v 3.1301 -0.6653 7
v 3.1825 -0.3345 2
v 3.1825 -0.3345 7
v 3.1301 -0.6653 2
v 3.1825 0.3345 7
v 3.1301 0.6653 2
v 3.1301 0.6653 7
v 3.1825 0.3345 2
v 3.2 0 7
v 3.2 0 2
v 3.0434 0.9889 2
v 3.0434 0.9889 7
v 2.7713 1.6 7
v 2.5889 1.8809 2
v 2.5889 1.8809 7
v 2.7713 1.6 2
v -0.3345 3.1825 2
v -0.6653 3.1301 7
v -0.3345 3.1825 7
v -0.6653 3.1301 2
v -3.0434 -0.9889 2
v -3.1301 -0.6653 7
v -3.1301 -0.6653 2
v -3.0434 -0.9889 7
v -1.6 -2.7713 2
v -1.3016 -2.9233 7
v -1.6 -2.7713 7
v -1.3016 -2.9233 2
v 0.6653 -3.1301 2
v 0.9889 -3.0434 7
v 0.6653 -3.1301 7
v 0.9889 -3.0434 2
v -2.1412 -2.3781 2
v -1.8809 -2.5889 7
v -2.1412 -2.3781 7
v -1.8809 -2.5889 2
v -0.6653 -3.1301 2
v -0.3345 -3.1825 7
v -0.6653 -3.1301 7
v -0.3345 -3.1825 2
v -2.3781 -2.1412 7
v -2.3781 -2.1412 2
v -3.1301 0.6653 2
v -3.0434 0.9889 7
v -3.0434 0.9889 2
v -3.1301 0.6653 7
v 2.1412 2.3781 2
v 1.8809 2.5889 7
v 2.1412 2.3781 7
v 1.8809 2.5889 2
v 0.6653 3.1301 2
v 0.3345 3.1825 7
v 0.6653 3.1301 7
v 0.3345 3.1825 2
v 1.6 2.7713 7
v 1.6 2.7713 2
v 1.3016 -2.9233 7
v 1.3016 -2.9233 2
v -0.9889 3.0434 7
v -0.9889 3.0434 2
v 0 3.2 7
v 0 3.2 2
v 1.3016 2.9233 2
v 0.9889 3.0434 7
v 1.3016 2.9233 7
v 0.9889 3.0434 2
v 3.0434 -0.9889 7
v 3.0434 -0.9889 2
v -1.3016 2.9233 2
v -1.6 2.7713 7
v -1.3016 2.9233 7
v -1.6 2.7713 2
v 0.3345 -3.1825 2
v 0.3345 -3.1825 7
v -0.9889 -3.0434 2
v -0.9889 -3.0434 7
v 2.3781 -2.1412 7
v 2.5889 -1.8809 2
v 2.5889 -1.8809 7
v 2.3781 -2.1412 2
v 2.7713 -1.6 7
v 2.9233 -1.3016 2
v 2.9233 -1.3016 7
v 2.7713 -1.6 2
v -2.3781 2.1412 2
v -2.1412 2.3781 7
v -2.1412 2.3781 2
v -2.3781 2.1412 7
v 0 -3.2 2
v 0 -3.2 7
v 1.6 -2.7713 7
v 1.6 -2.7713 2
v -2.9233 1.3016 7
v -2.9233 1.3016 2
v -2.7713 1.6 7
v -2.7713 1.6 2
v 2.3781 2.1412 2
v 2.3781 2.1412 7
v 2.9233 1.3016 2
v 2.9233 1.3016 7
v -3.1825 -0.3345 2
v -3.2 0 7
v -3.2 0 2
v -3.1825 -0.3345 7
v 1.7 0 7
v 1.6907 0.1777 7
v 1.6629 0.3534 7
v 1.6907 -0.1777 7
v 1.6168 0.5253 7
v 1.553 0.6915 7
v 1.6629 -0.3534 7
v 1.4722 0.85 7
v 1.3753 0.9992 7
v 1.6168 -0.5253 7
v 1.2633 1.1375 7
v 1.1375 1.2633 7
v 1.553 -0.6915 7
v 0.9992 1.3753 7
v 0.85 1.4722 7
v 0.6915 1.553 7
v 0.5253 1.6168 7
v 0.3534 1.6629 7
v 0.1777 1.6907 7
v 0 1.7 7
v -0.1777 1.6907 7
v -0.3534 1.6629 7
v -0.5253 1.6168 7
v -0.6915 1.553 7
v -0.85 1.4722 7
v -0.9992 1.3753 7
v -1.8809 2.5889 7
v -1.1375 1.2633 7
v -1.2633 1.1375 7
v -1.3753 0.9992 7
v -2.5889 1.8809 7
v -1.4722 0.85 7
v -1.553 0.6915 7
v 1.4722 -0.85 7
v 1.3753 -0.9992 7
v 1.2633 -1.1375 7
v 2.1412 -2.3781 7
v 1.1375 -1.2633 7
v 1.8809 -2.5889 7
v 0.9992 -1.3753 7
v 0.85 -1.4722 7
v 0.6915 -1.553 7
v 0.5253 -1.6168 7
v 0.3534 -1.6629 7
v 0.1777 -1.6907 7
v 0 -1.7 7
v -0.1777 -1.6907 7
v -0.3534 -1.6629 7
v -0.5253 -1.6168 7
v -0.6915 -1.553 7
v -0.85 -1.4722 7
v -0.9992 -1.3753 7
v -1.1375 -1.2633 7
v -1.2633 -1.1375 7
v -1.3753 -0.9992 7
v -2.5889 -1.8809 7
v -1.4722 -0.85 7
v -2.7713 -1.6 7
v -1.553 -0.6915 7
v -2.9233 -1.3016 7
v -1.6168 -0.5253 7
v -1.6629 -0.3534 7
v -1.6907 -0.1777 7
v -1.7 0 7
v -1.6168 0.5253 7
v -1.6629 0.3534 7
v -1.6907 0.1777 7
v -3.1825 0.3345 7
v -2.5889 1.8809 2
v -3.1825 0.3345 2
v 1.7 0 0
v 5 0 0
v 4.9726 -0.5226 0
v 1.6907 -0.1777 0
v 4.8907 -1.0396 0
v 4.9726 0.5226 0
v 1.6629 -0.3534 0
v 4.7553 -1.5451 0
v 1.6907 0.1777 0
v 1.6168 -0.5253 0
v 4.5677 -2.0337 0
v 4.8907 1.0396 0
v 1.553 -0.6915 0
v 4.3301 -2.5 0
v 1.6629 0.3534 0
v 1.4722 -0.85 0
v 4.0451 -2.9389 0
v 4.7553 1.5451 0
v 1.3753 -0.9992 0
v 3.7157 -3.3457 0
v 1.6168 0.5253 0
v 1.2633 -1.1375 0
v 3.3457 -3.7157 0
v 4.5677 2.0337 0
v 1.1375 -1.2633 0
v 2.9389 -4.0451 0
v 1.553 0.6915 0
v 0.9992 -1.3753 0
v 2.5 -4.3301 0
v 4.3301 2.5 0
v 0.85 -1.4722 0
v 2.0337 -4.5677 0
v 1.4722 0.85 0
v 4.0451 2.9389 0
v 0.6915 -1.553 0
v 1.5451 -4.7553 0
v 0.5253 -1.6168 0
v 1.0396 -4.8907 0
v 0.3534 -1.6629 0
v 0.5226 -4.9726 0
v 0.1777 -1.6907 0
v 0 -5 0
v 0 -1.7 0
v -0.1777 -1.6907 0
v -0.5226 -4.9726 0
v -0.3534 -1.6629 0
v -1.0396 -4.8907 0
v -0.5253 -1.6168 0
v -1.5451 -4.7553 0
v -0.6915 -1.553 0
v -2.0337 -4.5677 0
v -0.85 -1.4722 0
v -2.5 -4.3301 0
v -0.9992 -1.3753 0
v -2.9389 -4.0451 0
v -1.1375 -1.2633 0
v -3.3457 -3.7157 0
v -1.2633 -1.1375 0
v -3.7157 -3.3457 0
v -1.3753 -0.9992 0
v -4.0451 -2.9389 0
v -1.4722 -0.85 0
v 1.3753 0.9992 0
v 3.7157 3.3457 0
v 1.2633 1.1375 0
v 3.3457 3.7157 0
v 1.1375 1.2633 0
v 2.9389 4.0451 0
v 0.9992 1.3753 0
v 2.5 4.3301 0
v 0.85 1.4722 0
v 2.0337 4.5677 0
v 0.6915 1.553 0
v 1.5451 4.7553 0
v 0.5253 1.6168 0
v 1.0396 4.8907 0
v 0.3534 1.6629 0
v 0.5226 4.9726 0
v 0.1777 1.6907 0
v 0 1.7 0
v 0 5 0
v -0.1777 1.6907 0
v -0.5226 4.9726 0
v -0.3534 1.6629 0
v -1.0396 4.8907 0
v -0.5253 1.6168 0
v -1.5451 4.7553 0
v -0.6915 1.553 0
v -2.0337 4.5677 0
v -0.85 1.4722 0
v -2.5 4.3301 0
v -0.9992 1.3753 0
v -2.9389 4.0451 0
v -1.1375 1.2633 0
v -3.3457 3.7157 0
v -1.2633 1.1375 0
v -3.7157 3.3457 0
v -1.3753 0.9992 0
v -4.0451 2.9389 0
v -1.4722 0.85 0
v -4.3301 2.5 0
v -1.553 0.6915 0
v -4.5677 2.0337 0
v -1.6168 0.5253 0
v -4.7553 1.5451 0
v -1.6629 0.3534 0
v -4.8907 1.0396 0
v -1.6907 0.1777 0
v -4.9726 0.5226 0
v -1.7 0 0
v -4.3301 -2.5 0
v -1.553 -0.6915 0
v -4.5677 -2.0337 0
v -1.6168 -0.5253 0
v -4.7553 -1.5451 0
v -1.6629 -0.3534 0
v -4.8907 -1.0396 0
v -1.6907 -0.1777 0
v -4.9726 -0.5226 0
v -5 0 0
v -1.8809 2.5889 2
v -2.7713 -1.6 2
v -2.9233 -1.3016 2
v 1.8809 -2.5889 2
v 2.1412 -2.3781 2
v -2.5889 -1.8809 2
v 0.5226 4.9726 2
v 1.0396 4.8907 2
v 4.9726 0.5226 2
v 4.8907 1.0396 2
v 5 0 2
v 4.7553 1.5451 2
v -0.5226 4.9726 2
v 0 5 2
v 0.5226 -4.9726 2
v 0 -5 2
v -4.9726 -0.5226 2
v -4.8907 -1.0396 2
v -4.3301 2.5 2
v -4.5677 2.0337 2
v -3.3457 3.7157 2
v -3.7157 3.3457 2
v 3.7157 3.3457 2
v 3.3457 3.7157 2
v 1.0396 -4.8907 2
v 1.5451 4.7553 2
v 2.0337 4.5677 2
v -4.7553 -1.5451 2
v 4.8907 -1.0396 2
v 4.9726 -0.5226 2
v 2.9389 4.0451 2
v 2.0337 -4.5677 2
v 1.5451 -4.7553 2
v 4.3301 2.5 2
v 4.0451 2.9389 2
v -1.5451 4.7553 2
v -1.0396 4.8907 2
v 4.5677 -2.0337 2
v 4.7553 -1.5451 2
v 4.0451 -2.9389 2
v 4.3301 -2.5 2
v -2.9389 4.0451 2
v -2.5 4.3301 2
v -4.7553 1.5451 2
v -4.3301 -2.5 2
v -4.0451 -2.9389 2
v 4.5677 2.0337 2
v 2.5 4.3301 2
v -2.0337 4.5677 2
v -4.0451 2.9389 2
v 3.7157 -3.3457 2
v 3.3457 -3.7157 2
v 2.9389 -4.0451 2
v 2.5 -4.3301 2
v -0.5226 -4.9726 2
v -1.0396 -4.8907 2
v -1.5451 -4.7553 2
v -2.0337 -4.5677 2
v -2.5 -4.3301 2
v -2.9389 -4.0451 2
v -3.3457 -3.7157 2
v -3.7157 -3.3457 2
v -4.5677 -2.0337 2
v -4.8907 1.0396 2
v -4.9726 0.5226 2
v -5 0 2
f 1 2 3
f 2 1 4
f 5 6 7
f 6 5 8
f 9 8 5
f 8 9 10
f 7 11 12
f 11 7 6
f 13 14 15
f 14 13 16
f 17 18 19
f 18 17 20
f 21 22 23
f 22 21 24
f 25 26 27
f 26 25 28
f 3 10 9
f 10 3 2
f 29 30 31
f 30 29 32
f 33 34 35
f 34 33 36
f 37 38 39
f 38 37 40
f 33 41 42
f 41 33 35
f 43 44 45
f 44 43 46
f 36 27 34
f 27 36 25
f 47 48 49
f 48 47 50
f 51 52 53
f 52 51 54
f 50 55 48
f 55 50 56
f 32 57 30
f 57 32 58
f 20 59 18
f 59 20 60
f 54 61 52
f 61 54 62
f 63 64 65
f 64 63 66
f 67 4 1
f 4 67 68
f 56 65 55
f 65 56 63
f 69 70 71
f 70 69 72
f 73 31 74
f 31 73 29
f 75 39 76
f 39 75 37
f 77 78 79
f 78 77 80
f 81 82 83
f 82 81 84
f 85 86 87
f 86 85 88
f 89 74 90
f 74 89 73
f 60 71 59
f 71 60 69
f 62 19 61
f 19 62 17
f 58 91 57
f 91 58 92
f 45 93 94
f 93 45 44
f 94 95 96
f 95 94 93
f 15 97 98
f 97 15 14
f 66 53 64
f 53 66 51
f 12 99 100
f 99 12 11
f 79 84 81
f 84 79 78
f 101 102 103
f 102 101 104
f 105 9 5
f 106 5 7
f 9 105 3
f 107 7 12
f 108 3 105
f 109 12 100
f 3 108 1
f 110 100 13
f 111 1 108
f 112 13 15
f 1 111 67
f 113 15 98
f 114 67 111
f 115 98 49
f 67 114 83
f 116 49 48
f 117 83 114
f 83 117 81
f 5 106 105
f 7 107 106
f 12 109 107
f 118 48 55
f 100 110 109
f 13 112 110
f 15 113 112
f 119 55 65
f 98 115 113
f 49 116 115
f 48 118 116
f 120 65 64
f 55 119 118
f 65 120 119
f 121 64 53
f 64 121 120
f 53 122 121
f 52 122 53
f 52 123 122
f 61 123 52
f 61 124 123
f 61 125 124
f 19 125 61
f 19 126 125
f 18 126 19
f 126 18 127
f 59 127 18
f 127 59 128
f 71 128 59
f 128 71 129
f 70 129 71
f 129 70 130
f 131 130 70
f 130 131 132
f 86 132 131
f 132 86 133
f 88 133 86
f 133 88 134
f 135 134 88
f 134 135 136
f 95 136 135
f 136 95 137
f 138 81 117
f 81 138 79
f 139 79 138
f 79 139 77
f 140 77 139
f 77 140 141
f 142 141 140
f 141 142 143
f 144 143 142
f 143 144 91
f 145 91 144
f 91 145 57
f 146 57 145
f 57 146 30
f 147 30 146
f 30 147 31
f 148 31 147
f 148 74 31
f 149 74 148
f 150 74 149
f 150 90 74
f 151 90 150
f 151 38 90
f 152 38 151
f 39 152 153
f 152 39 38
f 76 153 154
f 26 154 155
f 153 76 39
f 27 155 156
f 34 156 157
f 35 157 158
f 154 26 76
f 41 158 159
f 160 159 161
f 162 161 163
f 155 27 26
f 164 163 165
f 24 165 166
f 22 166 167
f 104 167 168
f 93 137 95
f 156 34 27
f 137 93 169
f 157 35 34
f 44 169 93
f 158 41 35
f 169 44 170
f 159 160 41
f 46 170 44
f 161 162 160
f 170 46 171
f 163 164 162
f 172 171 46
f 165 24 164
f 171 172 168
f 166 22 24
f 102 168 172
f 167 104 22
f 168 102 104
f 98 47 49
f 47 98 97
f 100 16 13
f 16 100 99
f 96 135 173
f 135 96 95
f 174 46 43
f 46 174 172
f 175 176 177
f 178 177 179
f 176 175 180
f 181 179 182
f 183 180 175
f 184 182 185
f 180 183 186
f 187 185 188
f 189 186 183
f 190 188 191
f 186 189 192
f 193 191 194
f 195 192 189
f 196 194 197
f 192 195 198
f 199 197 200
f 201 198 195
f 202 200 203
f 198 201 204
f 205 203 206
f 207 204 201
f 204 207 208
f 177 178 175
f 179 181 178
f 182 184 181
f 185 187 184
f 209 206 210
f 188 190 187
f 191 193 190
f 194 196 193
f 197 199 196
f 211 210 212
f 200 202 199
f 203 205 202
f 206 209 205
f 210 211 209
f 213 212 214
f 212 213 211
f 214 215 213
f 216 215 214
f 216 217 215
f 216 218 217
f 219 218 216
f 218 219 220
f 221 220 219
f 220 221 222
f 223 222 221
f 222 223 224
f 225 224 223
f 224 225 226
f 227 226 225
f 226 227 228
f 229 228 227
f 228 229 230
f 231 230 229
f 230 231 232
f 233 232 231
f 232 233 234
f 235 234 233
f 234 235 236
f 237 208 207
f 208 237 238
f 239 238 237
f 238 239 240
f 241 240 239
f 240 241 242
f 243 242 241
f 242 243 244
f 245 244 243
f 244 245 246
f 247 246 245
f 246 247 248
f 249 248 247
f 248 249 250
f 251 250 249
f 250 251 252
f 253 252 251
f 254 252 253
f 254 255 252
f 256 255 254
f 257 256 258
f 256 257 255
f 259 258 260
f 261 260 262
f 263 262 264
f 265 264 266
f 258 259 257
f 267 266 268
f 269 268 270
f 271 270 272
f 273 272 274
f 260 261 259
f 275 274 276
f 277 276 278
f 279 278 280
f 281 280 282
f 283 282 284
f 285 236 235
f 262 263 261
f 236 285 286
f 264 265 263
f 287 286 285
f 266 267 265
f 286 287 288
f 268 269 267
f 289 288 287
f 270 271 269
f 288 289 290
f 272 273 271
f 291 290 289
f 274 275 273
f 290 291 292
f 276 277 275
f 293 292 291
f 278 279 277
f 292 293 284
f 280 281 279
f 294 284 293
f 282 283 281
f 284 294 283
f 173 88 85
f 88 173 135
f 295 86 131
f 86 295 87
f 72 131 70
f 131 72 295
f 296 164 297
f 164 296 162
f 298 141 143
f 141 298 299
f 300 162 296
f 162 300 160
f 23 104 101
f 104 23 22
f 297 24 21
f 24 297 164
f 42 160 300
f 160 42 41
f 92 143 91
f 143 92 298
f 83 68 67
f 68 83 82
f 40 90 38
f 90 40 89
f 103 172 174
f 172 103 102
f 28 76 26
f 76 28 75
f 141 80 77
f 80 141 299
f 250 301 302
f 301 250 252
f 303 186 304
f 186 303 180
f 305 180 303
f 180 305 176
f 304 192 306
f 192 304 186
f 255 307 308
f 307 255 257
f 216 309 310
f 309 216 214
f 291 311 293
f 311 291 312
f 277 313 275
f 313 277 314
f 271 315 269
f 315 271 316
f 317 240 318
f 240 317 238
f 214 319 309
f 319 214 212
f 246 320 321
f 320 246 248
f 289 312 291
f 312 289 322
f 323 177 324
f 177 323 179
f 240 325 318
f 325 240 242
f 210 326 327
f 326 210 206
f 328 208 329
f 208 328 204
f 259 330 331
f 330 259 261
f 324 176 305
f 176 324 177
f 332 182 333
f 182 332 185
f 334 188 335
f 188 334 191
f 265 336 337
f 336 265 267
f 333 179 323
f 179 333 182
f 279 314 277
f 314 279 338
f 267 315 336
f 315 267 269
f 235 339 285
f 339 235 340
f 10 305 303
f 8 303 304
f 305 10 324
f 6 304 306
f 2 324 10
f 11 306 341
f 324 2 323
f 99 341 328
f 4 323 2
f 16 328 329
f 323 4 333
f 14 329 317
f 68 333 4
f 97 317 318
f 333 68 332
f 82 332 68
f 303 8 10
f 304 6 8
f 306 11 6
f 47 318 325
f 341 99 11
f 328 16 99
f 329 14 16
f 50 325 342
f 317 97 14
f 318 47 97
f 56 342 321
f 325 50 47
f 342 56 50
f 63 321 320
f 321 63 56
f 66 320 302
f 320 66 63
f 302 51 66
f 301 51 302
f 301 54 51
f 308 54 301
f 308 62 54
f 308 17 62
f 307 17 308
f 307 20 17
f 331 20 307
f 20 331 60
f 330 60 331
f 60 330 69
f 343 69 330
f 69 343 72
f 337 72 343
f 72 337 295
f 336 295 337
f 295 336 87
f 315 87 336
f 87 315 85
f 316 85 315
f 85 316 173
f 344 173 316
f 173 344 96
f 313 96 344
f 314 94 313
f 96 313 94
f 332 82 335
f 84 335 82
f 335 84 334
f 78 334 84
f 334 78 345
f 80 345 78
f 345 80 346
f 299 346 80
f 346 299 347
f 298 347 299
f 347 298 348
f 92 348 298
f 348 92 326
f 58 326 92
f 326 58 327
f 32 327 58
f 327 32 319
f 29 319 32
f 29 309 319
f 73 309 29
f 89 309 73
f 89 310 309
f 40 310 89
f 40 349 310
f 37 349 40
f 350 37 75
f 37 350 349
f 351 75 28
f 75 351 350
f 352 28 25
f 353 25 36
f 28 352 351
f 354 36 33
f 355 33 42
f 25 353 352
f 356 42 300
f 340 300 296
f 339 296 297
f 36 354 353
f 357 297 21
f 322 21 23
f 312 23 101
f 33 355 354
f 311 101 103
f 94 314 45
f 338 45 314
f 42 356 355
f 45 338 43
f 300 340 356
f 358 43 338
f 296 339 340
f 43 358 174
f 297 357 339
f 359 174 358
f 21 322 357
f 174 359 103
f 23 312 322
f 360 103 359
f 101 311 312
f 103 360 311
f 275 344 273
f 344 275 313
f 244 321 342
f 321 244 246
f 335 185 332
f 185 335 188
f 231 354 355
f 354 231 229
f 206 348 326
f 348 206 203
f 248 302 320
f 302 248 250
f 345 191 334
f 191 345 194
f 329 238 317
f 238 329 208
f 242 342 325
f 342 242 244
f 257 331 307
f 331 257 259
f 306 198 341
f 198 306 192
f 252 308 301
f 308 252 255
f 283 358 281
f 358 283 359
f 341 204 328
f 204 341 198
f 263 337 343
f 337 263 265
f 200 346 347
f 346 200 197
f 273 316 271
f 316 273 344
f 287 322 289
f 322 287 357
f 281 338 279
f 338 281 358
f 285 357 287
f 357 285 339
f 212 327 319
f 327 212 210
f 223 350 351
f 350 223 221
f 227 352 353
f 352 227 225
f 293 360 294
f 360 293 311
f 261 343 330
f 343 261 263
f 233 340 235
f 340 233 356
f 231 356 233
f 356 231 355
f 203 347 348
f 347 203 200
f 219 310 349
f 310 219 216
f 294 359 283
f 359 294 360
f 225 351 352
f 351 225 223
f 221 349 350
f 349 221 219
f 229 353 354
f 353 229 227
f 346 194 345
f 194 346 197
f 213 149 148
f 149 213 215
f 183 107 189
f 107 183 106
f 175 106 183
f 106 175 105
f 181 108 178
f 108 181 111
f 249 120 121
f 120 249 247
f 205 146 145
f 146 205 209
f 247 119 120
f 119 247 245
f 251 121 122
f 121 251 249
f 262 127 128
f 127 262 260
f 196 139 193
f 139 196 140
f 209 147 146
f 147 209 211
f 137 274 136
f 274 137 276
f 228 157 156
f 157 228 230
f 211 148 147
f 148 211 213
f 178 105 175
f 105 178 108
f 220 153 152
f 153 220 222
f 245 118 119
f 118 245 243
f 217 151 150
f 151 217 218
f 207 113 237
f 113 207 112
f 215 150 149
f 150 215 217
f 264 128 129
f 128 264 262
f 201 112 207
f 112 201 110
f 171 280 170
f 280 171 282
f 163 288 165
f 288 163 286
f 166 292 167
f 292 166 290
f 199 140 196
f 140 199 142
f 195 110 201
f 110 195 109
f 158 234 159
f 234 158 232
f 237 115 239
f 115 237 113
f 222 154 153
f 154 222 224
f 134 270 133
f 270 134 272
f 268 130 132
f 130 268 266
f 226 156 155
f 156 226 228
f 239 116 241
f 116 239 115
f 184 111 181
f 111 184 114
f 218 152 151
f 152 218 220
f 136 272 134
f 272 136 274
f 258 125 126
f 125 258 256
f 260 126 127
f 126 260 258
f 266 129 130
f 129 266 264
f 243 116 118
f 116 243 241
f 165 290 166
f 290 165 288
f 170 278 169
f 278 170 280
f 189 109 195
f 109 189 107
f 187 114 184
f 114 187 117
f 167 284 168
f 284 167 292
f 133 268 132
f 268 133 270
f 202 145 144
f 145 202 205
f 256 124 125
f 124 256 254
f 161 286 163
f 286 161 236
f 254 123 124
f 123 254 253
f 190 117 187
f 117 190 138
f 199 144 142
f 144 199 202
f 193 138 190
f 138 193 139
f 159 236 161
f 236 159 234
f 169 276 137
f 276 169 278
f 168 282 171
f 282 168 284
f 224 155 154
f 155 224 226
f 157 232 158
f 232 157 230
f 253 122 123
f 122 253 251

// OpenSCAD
// Rivet nut / nutsert.
$fn = 60;
eps = 0.02;
thread_d = 3.4;
outer_d = 6;
length = 7;
flange_d = 10;
difference() { union() { cylinder(d=max(outer_d, thread_d+3),h=length); cylinder(d=max(flange_d, thread_d+6),h=2); } translate([0,0,-eps]) cylinder(d=thread_d,h=length+2*eps); }
